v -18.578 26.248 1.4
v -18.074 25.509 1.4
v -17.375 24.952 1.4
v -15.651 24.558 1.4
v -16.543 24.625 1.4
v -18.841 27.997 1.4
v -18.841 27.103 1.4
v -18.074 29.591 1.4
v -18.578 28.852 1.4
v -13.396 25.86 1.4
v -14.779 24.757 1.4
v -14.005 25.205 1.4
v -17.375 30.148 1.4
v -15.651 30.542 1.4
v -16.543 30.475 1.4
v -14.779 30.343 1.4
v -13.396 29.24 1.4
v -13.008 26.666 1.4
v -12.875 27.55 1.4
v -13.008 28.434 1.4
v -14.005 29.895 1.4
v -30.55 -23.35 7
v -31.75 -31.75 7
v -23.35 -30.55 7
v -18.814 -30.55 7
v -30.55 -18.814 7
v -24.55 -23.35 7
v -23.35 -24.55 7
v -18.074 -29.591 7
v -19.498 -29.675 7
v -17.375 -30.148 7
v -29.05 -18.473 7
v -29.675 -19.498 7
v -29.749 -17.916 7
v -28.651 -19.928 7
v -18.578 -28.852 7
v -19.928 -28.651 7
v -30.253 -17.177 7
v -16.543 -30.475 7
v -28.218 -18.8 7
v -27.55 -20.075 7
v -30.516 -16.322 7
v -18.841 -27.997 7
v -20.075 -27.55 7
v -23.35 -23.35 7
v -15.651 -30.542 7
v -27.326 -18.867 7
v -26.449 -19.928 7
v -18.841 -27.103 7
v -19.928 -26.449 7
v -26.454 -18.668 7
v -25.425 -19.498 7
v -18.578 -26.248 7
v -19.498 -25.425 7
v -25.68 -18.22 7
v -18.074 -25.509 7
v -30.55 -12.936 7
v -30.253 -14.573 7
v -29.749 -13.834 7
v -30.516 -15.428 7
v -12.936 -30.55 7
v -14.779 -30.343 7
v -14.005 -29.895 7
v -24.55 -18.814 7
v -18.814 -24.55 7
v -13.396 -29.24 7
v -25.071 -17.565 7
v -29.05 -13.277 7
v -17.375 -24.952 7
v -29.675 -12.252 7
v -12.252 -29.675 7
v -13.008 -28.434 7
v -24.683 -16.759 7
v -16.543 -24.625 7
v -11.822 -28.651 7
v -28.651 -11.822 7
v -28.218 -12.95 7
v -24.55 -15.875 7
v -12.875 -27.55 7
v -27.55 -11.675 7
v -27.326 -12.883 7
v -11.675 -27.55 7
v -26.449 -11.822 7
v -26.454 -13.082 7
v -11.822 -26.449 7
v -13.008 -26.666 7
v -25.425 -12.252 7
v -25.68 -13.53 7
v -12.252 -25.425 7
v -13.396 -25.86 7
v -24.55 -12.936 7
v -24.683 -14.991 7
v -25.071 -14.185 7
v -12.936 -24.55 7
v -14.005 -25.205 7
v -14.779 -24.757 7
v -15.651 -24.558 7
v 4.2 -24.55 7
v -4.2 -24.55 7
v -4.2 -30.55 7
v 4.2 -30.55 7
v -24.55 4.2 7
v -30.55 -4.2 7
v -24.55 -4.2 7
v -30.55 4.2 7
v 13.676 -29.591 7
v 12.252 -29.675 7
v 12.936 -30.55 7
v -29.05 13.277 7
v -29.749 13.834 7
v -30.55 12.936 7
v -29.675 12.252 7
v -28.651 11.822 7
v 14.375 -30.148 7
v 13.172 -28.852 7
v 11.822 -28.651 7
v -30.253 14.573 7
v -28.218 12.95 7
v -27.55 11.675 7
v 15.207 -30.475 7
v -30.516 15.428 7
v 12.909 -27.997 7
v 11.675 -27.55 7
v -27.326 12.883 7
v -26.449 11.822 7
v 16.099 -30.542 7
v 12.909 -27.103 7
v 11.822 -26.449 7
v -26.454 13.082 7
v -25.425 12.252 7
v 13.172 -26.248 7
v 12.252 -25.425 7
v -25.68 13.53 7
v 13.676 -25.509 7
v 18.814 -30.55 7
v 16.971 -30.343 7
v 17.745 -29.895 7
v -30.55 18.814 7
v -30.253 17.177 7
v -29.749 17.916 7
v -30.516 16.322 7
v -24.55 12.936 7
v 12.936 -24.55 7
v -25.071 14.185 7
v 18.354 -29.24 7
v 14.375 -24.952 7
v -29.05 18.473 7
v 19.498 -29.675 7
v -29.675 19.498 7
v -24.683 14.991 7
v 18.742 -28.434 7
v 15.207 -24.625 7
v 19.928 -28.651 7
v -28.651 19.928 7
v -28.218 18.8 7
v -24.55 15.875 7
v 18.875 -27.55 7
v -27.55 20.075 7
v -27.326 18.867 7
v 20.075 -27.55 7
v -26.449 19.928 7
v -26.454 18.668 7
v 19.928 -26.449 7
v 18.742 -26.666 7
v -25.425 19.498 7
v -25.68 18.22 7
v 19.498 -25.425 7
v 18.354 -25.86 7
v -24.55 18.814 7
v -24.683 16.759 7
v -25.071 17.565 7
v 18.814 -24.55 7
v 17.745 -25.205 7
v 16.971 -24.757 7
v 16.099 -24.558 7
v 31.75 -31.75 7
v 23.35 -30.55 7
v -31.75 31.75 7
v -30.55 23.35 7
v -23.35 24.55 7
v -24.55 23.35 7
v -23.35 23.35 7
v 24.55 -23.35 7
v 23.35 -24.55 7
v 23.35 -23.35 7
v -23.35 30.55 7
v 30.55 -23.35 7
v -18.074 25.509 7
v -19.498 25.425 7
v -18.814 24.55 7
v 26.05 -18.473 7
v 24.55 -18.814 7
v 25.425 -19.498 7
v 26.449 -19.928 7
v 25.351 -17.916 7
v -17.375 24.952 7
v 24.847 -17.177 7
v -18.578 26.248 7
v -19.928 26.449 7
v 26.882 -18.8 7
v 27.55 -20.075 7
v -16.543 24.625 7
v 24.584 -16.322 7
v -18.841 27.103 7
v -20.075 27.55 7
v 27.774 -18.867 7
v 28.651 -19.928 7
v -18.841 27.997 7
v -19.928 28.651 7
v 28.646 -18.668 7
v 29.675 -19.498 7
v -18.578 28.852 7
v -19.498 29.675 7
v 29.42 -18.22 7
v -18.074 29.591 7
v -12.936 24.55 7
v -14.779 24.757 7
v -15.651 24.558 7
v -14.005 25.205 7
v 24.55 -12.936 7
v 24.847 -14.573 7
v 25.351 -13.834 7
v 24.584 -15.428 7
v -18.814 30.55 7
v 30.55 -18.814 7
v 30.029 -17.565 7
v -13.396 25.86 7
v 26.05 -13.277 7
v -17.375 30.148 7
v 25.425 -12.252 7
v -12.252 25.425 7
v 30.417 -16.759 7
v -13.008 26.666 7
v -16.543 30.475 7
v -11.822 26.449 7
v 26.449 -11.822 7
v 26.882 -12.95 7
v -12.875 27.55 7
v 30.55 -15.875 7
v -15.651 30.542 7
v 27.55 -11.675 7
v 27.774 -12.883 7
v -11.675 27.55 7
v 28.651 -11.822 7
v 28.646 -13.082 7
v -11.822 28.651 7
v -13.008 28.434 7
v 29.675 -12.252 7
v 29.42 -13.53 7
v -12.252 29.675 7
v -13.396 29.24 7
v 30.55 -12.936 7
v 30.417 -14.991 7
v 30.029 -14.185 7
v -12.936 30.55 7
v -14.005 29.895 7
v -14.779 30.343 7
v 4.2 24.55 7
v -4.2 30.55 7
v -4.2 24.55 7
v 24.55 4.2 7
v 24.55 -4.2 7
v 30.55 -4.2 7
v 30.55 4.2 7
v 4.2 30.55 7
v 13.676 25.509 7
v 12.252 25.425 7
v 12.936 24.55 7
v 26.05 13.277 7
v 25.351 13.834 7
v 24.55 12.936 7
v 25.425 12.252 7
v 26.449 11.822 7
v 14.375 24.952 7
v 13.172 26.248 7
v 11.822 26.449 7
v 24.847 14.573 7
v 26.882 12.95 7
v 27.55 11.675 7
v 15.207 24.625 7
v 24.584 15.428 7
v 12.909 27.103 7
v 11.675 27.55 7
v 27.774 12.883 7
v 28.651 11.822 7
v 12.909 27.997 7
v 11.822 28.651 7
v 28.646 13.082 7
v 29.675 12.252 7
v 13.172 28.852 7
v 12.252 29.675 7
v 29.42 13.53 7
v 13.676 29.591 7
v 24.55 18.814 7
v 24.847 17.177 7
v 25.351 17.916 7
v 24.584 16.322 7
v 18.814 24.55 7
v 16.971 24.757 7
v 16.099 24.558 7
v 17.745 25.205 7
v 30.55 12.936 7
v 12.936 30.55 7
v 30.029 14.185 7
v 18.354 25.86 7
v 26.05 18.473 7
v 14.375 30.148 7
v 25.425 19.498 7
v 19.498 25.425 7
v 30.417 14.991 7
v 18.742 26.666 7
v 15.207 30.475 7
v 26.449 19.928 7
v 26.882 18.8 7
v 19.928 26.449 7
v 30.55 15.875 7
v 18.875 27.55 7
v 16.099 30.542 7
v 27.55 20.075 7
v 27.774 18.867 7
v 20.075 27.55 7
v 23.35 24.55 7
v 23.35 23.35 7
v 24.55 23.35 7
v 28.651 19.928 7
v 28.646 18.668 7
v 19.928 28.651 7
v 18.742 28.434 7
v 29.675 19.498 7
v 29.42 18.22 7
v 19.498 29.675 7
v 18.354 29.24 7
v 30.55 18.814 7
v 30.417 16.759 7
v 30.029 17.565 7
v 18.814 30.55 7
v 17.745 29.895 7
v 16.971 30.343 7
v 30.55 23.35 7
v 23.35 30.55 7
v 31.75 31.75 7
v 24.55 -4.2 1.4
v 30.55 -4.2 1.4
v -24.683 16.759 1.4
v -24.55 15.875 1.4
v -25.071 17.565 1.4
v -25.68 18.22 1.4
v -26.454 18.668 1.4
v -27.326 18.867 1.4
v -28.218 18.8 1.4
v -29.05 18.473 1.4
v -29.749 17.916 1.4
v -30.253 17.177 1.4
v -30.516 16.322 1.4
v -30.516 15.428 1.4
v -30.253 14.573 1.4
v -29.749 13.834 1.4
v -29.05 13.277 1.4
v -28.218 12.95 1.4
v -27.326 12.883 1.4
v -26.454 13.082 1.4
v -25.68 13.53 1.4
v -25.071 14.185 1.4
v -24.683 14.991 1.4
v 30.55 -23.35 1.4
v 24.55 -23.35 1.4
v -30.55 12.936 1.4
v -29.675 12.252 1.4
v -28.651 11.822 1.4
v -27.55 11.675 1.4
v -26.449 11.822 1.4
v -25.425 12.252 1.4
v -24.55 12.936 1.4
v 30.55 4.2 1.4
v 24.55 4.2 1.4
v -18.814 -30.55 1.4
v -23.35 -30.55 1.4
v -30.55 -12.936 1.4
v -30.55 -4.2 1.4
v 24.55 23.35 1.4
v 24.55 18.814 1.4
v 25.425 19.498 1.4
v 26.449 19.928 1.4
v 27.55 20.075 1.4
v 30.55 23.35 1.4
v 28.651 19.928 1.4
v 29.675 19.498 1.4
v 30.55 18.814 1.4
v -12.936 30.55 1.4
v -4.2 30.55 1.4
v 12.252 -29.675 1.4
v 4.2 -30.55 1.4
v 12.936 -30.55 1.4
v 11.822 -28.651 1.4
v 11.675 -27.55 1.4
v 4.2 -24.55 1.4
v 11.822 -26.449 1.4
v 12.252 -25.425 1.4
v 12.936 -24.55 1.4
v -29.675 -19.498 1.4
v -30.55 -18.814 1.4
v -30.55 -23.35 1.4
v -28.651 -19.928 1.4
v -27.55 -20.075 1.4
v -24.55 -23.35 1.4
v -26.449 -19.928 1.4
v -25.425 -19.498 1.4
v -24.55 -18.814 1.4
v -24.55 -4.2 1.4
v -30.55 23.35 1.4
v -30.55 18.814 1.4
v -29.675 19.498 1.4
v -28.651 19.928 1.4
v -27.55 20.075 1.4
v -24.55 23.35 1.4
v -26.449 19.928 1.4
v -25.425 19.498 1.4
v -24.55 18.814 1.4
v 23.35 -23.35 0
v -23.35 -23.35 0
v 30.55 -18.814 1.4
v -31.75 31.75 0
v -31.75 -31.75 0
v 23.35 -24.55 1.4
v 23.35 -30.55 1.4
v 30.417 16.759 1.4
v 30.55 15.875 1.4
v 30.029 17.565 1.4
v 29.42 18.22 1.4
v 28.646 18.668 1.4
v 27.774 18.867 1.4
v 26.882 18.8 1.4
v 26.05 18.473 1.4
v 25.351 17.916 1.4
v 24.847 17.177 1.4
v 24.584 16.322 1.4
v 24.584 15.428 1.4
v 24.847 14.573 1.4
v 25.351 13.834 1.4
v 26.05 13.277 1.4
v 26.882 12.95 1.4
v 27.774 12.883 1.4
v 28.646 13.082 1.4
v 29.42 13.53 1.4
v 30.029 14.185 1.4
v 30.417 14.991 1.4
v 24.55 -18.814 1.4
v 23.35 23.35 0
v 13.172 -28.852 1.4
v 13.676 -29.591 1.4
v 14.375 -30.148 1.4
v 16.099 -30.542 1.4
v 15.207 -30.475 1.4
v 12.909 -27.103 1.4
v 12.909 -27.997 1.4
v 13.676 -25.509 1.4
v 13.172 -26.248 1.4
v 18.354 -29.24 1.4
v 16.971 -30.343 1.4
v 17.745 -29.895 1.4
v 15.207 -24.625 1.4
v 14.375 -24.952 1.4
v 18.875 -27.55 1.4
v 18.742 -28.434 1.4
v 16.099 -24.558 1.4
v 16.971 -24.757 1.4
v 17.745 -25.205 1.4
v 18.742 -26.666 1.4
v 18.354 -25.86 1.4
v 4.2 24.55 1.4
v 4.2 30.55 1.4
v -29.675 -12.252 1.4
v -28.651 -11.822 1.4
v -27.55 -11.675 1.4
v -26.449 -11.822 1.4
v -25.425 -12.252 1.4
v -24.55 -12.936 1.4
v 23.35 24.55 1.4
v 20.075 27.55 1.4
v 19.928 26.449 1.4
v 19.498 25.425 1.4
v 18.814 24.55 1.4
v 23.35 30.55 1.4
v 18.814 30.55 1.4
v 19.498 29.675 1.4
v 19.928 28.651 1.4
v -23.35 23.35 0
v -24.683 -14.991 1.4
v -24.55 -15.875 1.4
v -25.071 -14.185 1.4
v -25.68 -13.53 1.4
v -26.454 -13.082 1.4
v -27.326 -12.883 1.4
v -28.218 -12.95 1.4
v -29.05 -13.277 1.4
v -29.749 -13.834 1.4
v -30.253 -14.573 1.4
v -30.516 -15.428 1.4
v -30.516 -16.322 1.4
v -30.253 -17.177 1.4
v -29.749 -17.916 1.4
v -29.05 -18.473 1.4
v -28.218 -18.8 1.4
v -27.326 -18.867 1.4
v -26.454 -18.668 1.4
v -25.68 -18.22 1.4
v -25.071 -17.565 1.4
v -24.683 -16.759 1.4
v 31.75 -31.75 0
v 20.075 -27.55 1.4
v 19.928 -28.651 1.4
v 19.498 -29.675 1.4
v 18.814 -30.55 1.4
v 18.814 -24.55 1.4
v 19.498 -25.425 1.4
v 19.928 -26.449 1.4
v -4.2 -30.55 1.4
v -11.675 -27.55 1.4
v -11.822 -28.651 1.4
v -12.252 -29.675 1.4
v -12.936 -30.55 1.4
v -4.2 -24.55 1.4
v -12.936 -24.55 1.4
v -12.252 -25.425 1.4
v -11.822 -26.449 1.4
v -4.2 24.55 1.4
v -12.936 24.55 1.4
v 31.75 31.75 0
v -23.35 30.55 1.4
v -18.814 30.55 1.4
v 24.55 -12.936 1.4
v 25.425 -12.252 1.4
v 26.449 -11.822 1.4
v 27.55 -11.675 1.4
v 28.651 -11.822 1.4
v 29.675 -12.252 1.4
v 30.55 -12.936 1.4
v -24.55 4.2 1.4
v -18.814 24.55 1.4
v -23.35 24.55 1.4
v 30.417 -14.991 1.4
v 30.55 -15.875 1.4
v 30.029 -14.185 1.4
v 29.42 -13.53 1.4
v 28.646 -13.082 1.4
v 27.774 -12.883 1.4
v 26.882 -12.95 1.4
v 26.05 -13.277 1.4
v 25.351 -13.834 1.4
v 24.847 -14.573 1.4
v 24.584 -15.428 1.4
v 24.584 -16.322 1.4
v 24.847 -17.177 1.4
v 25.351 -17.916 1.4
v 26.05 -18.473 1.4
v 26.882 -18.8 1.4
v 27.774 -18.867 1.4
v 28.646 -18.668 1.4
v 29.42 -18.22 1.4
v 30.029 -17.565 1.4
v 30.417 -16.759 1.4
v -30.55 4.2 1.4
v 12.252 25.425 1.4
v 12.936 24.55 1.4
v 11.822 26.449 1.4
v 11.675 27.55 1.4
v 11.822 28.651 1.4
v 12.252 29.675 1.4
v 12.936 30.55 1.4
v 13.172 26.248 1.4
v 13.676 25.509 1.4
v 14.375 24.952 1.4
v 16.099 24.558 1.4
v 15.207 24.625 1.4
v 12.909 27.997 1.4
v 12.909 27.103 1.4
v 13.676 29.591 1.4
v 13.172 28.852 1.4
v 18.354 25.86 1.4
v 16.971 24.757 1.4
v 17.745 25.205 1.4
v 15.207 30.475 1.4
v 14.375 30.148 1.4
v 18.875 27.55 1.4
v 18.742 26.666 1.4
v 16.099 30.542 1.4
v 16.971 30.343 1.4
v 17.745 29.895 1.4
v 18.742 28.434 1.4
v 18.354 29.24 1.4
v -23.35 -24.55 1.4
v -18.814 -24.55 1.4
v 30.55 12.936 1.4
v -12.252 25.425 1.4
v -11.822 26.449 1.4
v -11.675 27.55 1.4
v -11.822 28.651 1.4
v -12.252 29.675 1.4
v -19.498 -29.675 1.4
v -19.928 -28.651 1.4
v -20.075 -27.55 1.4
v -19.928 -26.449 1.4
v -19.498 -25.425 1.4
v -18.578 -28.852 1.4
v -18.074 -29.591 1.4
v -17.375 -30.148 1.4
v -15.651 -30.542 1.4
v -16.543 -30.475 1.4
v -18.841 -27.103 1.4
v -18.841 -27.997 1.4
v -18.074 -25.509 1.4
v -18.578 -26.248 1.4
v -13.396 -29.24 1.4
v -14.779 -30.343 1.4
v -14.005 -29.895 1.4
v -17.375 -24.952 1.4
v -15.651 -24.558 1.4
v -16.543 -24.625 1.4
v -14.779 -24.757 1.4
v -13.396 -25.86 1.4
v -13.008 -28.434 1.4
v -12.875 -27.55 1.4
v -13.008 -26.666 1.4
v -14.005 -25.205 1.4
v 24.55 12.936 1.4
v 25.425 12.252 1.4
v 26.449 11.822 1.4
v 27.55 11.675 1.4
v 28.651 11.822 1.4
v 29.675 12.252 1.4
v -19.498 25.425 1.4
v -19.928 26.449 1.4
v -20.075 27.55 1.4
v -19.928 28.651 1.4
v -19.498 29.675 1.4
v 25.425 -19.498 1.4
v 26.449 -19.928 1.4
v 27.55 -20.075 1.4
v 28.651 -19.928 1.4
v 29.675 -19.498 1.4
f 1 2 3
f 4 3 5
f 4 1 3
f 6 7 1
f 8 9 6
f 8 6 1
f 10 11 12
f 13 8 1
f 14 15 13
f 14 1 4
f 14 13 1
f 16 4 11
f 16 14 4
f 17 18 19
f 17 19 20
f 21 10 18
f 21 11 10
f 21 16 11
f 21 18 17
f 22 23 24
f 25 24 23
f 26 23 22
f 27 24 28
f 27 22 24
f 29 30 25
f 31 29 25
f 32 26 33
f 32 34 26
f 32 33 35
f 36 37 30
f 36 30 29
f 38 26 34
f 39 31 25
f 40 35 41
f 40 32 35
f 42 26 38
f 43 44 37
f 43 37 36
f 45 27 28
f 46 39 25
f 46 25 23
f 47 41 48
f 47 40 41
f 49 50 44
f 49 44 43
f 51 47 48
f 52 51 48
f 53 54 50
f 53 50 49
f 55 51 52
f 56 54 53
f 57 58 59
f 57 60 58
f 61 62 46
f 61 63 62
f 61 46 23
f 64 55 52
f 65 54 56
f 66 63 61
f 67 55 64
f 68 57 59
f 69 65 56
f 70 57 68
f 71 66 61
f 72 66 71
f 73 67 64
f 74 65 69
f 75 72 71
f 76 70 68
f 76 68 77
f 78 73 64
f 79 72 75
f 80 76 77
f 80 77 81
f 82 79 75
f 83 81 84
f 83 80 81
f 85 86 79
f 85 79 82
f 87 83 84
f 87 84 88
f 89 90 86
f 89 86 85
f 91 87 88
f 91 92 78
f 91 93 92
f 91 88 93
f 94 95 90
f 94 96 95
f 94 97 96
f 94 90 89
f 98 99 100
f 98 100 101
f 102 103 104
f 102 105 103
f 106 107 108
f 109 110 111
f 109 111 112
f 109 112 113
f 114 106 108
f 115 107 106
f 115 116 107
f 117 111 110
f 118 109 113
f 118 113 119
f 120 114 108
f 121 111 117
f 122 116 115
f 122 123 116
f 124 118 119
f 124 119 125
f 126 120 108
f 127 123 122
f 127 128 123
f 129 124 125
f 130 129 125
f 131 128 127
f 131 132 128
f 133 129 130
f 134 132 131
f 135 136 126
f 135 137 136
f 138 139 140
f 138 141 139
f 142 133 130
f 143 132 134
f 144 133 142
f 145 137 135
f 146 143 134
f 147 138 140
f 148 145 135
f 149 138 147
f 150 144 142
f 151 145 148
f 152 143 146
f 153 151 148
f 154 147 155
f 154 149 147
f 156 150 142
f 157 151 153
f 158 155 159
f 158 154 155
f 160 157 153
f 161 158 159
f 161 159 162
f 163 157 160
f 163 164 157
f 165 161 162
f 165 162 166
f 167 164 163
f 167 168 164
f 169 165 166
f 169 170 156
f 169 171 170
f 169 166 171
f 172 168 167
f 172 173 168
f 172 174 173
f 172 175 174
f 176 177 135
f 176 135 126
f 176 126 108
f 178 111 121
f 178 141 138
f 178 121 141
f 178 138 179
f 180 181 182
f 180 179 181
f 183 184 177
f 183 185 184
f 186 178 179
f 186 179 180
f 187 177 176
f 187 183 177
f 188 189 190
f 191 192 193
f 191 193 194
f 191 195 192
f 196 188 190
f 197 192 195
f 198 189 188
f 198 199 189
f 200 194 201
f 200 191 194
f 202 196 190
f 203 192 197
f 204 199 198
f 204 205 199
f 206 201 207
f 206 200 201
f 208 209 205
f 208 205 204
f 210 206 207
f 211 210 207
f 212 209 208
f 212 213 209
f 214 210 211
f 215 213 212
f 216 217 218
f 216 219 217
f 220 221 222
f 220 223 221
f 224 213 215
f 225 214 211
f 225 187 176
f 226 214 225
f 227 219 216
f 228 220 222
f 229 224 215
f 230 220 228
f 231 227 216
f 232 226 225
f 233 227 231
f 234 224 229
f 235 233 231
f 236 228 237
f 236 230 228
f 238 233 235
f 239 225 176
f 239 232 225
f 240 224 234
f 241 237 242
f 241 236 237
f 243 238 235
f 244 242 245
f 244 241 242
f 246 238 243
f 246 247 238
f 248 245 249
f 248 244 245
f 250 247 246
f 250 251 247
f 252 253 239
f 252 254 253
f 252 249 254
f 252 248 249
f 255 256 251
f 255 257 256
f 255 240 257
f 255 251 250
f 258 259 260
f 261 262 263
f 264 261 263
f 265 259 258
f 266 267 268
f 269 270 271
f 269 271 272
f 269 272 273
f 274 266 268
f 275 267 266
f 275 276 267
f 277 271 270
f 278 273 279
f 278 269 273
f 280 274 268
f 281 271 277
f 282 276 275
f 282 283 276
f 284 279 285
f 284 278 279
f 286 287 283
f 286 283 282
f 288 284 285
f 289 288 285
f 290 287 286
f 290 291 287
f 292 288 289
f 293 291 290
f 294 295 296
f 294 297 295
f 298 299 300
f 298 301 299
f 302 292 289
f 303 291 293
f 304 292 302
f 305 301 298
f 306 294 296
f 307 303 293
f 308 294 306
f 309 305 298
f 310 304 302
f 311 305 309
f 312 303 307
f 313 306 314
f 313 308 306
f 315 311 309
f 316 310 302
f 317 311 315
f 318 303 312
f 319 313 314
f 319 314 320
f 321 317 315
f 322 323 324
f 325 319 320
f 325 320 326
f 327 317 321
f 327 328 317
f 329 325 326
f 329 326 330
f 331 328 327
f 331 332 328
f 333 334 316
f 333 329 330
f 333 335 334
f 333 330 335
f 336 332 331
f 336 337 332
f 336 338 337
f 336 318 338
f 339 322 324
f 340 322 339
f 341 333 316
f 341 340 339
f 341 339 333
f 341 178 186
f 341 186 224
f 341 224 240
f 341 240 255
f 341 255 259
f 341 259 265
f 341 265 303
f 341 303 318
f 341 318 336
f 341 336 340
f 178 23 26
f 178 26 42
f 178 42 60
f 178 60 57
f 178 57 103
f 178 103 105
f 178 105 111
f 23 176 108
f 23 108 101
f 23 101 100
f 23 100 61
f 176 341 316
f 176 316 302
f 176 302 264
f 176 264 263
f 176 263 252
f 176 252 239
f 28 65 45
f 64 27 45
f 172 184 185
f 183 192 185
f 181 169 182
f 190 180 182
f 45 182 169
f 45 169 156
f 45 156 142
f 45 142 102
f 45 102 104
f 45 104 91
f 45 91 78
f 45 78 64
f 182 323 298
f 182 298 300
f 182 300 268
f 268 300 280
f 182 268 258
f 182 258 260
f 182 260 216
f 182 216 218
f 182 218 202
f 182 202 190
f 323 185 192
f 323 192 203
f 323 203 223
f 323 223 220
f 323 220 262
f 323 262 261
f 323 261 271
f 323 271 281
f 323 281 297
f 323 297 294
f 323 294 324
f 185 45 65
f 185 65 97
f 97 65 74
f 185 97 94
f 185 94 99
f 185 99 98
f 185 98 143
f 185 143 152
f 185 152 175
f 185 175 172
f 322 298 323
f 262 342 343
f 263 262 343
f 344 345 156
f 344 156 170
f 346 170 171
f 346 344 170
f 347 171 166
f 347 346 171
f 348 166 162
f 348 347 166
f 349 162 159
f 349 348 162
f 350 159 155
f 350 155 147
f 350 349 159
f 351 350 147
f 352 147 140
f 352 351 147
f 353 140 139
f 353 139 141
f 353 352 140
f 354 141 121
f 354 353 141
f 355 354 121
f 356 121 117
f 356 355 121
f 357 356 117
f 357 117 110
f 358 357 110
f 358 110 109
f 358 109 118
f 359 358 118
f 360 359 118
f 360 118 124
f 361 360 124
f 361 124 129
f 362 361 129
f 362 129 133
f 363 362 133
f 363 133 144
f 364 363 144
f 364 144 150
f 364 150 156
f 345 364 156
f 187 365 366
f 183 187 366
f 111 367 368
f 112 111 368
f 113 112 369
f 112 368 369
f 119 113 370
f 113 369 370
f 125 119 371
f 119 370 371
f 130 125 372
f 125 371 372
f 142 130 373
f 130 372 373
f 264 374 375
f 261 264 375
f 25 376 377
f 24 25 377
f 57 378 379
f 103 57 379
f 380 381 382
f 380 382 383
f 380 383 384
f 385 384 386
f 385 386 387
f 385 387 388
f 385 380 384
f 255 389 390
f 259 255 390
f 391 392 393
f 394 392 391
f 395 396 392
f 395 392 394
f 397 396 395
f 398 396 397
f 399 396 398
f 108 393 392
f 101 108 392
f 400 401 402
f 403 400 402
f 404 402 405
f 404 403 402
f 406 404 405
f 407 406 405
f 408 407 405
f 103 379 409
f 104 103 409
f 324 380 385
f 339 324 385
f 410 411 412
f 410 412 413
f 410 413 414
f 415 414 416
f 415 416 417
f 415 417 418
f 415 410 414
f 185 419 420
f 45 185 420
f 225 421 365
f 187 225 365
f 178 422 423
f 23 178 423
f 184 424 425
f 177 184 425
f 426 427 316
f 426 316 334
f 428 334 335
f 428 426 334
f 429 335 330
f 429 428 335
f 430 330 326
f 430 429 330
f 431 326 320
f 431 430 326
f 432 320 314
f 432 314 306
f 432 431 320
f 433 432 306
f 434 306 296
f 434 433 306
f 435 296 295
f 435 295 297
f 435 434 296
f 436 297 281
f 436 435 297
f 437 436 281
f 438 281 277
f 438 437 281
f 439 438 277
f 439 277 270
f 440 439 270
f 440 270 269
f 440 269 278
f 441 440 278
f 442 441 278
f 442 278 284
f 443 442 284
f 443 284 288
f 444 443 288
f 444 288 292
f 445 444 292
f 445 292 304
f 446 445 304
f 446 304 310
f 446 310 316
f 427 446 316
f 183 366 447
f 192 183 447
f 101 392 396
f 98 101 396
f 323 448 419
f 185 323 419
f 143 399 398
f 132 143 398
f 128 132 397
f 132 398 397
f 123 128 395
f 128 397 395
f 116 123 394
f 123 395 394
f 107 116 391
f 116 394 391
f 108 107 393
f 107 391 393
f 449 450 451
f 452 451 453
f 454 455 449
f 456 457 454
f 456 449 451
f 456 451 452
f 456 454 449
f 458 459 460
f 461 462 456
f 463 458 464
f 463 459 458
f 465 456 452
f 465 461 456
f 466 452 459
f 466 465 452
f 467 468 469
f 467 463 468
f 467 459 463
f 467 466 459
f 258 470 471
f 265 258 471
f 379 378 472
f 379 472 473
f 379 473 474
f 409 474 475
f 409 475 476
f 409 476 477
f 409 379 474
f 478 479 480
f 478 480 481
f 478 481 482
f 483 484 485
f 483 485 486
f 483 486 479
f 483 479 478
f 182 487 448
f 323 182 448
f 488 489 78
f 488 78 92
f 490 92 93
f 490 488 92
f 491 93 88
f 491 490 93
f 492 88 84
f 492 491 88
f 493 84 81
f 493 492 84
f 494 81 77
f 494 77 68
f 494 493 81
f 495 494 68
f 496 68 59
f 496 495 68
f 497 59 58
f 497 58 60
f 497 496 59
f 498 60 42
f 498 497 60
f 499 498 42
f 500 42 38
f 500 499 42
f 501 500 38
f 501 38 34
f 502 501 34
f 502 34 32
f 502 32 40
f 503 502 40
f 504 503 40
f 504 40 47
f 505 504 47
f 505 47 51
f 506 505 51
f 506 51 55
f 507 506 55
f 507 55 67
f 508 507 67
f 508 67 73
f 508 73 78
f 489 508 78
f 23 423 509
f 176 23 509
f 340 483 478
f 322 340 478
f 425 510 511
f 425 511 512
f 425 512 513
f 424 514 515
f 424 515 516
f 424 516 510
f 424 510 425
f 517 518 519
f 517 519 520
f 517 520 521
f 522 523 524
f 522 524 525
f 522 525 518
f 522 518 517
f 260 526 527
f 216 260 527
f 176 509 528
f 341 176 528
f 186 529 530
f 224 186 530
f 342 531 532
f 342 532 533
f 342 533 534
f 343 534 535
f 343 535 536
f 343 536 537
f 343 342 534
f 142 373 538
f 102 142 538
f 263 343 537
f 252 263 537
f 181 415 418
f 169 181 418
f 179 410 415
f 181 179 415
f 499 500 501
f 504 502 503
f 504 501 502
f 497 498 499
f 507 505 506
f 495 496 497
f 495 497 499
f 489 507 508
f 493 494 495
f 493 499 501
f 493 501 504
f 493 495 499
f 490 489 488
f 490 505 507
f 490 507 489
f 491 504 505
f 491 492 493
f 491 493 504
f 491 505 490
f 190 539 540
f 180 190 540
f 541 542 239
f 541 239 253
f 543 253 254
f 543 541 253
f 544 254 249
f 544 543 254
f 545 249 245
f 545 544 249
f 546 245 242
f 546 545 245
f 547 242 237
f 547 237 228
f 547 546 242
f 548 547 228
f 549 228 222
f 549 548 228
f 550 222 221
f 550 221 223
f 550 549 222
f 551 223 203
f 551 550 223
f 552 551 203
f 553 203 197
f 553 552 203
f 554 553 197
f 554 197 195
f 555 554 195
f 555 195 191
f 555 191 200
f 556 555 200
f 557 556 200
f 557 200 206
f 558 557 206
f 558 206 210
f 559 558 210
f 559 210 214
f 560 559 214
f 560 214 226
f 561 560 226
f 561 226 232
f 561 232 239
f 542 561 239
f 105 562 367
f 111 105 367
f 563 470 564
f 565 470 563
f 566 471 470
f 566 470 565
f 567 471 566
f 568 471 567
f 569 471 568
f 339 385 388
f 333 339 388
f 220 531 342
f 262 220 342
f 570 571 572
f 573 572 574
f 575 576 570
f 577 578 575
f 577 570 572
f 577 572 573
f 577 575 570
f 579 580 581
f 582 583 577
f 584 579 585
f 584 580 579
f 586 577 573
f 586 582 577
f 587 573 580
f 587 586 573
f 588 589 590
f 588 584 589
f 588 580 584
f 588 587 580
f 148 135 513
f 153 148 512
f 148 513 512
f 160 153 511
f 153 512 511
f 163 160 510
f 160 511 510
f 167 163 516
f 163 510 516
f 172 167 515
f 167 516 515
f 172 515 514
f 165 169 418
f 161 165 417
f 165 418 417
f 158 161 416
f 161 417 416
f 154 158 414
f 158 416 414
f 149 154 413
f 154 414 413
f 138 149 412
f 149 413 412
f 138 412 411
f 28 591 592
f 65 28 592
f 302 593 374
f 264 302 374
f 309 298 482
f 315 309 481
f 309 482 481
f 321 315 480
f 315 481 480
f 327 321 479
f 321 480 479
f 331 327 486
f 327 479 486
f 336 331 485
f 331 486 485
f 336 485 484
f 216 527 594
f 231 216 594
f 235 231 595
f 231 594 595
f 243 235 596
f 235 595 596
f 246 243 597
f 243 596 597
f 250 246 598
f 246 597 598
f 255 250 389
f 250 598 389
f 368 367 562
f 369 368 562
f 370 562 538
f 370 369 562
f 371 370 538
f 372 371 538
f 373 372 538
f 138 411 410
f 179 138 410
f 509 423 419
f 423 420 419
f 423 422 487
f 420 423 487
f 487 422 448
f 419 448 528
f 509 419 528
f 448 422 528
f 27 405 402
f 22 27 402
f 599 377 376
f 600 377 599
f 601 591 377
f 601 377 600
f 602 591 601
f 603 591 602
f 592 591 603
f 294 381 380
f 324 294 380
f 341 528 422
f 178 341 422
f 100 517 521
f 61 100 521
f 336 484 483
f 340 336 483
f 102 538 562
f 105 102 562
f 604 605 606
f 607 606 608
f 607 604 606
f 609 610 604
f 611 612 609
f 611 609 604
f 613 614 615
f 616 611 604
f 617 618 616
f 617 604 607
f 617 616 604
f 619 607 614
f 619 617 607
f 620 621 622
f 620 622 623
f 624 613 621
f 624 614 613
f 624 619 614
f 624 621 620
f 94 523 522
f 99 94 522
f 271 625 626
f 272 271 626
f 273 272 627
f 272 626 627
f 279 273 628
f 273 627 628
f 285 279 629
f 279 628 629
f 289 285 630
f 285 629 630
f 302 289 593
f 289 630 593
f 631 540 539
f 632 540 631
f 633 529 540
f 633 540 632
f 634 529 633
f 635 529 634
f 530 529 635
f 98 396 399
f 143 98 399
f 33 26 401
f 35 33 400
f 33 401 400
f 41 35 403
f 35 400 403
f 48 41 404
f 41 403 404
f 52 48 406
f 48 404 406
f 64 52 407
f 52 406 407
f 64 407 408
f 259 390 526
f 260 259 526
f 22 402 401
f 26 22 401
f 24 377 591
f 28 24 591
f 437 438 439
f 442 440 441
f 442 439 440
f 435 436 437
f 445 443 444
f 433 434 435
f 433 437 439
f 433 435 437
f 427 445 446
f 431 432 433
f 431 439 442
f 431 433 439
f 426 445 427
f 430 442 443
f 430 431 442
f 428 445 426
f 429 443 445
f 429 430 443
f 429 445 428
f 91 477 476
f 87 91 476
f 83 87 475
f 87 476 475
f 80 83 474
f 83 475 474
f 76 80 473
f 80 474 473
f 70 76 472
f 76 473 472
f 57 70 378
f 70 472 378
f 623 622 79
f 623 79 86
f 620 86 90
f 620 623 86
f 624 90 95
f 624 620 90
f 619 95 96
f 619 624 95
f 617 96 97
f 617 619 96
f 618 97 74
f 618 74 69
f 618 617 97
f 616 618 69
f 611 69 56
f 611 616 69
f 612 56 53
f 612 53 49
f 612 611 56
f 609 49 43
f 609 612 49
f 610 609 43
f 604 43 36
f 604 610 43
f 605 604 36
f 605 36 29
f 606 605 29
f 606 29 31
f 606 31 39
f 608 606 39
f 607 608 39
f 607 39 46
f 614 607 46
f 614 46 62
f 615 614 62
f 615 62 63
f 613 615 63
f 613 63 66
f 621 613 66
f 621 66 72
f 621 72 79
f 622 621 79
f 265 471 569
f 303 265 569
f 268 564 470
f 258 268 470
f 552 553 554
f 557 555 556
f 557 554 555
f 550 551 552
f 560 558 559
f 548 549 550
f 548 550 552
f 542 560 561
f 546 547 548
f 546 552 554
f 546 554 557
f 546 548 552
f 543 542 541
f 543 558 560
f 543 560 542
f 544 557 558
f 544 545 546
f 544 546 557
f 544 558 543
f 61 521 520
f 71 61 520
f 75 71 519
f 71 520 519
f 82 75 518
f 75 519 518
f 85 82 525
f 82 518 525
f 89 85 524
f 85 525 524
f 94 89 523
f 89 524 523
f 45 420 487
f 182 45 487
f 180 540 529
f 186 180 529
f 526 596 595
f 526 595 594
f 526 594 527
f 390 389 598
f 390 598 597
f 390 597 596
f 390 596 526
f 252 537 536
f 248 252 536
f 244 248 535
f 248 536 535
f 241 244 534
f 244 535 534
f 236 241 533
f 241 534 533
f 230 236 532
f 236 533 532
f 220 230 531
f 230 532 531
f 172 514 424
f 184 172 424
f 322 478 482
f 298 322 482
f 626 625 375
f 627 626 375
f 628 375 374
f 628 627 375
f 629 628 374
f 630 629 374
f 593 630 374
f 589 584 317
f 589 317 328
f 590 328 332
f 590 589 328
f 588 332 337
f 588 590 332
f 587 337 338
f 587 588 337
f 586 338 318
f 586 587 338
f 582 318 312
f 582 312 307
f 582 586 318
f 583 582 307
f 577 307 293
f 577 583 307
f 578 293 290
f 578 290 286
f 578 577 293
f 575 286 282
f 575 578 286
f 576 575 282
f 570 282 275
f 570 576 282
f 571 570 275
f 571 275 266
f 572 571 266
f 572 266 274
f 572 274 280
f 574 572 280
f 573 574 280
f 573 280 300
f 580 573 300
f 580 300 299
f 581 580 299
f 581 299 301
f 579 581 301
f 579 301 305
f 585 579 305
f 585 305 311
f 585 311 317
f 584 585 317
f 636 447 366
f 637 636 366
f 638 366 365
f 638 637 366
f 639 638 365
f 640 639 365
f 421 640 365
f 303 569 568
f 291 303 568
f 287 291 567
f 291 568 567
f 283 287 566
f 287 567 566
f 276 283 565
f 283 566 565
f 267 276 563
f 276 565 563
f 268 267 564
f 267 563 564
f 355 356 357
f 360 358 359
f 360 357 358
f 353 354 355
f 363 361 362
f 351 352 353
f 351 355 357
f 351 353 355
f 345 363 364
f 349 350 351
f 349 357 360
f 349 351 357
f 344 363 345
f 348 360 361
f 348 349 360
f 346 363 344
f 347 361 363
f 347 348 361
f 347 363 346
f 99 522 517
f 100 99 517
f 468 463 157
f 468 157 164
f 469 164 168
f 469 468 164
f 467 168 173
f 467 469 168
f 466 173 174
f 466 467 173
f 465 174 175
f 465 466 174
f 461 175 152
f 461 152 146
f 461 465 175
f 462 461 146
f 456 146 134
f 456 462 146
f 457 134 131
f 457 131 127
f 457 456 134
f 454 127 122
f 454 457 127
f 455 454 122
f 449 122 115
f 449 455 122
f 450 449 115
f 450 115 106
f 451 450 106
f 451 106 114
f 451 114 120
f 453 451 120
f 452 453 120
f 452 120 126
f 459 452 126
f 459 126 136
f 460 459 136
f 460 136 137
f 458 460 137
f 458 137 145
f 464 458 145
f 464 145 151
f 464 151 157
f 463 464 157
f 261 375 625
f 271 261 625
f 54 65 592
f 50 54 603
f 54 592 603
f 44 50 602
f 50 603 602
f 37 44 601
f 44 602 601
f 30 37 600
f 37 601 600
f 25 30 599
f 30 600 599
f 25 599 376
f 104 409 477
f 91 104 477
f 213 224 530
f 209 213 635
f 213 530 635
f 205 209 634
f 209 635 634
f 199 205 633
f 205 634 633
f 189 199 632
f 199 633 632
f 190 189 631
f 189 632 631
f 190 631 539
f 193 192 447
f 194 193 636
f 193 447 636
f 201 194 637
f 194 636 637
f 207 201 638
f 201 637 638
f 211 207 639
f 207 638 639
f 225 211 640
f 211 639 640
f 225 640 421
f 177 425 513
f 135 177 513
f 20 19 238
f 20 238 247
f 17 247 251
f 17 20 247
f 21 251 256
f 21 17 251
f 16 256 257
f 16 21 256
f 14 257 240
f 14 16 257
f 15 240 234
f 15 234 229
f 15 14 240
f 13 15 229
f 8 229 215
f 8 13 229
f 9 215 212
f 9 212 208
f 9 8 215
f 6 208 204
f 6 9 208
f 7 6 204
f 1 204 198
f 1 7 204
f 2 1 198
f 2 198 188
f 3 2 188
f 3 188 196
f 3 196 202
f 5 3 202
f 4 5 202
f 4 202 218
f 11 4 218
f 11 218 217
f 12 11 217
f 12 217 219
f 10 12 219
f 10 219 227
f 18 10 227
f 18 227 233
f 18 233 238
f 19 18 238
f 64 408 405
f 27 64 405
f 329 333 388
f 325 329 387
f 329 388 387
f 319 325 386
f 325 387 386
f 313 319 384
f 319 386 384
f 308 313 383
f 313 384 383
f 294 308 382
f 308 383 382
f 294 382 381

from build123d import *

# Parameters (mm, degrees)
F0_R     = 3
F1_DEPTH = 1.4
F2_DEPTH = 7


with BuildPart() as f1:
    # F0 (on Top) → F1 (new body)
    with BuildSketch(Plane.XY):
        Polygon((31.75, 31.75), (0, 31.75), (-31.75, 31.75), (-31.75, 0), (-31.75, -31.75), (0, -31.75), (31.75, -31.75), (31.75, 0), align=None)
        with BuildLine():
            ThreePointArc((-18.814388, -24.55), (-20.075, -27.55), (-18.814388, -30.55))
            Line((-18.814388, -30.55), (-23.35, -30.55))
            Line((-23.35, -30.55), (-23.35, -24.55))
            Line((-23.35, -24.55), (-18.814388, -24.55))
        make_face(mode=Mode.SUBTRACT)
        with BuildLine():
            Line((-24.55, -18.814388), (-24.55, -23.35))
            Line((-24.55, -23.35), (-30.55, -23.35))
            Line((-30.55, -23.35), (-30.55, -18.814388))
            ThreePointArc((-30.55, -18.814388), (-27.55, -20.075), (-24.55, -18.814388))
        make_face(mode=Mode.SUBTRACT)
        with Locations((-15.875, -27.55)):
            Circle(F0_R, mode=Mode.SUBTRACT)
        with Locations((-27.55, -15.875)):
            Circle(F0_R, mode=Mode.SUBTRACT)
        with BuildLine():
            Line((4.2, -30.55), (0, -30.55))
            Line((0, -30.55), (-4.2, -30.55))
            Line((-4.2, -30.55), (-12.935612, -30.55))
            ThreePointArc((-12.935612, -30.55), (-11.675, -27.55), (-12.935612, -24.55))
            Line((-12.935612, -24.55), (-4.2, -24.55))
            Line((-4.2, -24.55), (0, -24.55))
            Line((0, -24.55), (4.2, -24.55))
            Line((4.2, -24.55), (12.935612, -24.55))
            ThreePointArc((12.935612, -24.55), (11.675, -27.55), (12.935612, -30.55))
            Line((12.935612, -30.55), (4.2, -30.55))
        make_face(mode=Mode.SUBTRACT)
        with Locations((15.875, -27.55)):
            Circle(F0_R, mode=Mode.SUBTRACT)
        with BuildLine():
            Line((23.35, -30.55), (18.814388, -30.55))
            ThreePointArc((18.814388, -30.55), (20.075, -27.55), (18.814388, -24.55))
            Line((18.814388, -24.55), (23.35, -24.55))
            Line((23.35, -24.55), (23.35, -30.55))
        make_face(mode=Mode.SUBTRACT)
        with BuildLine():
            Line((30.55, -23.35), (24.55, -23.35))
            Line((24.55, -23.35), (24.55, -18.814388))
            ThreePointArc((24.55, -18.814388), (27.55, -20.075), (30.55, -18.814388))
            Line((30.55, -18.814388), (30.55, -23.35))
        make_face(mode=Mode.SUBTRACT)
        with Locations((27.55, -15.875)):
            Circle(F0_R, mode=Mode.SUBTRACT)
        with BuildLine():
            Line((-30.55, 0), (-30.55, 4.2))
            Line((-30.55, 4.2), (-30.55, 12.935612))
            ThreePointArc((-30.55, 12.935612), (-27.55, 11.675), (-24.55, 12.935612))
            Line((-24.55, 12.935612), (-24.55, 4.2))
            Line((-24.55, 4.2), (-24.55, 0))
            Line((-24.55, 0), (-24.55, -4.2))
            Line((-24.55, -4.2), (-24.55, -12.935612))
            ThreePointArc((-24.55, -12.935612), (-27.55, -11.675), (-30.55, -12.935612))
            Line((-30.55, -12.935612), (-30.55, -4.2))
            Line((-30.55, -4.2), (-30.55, 0))
        make_face(mode=Mode.SUBTRACT)
        with Locations((-27.55, 15.875)):
            Circle(F0_R, mode=Mode.SUBTRACT)
        with BuildLine():
            Line((-30.55, 18.814388), (-30.55, 23.35))
            Line((-30.55, 23.35), (-24.55, 23.35))
            Line((-24.55, 23.35), (-24.55, 18.814388))
            ThreePointArc((-24.55, 18.814388), (-27.55, 20.075), (-30.55, 18.814388))
        make_face(mode=Mode.SUBTRACT)
        with BuildLine():
            Line((-18.814388, 24.55), (-23.35, 24.55))
            Line((-23.35, 24.55), (-23.35, 30.55))
            Line((-23.35, 30.55), (-18.814388, 30.55))
            ThreePointArc((-18.814388, 30.55), (-20.075, 27.55), (-18.814388, 24.55))
        make_face(mode=Mode.SUBTRACT)
        with Locations((-15.875, 27.55)):
            Circle(F0_R, mode=Mode.SUBTRACT)
        Polygon((-23.35, 0), (-23.35, 23.35), (0, 23.35), (23.35, 23.35), (23.35, 0), (23.35, -23.35), (0, -23.35), (-23.35, -23.35), align=None, mode=Mode.SUBTRACT)
        with BuildLine():
            Line((24.55, 4.2), (24.55, 12.935612))
            ThreePointArc((24.55, 12.935612), (27.55, 11.675), (30.55, 12.935612))
            Line((30.55, 12.935612), (30.55, 4.2))
            Line((30.55, 4.2), (30.55, 0))
            Line((30.55, 0), (30.55, -4.2))
            Line((30.55, -4.2), (30.55, -12.935612))
            ThreePointArc((30.55, -12.935612), (27.55, -11.675), (24.55, -12.935612))
            Line((24.55, -12.935612), (24.55, -4.2))
            Line((24.55, -4.2), (24.55, 0))
            Line((24.55, 0), (24.55, 4.2))
        make_face(mode=Mode.SUBTRACT)
        with BuildLine():
            Line((-4.2, 30.55), (0, 30.55))
            Line((0, 30.55), (4.2, 30.55))
            Line((4.2, 30.55), (12.935612, 30.55))
            ThreePointArc((12.935612, 30.55), (11.675, 27.55), (12.935612, 24.55))
            Line((12.935612, 24.55), (4.2, 24.55))
            Line((4.2, 24.55), (0, 24.55))
            Line((0, 24.55), (-4.2, 24.55))
            Line((-4.2, 24.55), (-12.935612, 24.55))
            ThreePointArc((-12.935612, 24.55), (-11.675, 27.55), (-12.935612, 30.55))
            Line((-12.935612, 30.55), (-4.2, 30.55))
        make_face(mode=Mode.SUBTRACT)
        with Locations((27.55, 15.875)):
            Circle(F0_R, mode=Mode.SUBTRACT)
        with BuildLine():
            ThreePointArc((30.55, 18.814388), (27.55, 20.075), (24.55, 18.814388))
            Line((24.55, 18.814388), (24.55, 23.35))
            Line((24.55, 23.35), (30.55, 23.35))
            Line((30.55, 23.35), (30.55, 18.814388))
        make_face(mode=Mode.SUBTRACT)
        with Locations((15.875, 27.55)):
            Circle(F0_R, mode=Mode.SUBTRACT)
        with BuildLine():
            ThreePointArc((18.814388, 24.55), (20.075, 27.55), (18.814388, 30.55))
            Line((18.814388, 30.55), (23.35, 30.55))
            Line((23.35, 30.55), (23.35, 24.55))
            Line((23.35, 24.55), (18.814388, 24.55))
        make_face(mode=Mode.SUBTRACT)
        with BuildLine():
            Line((-24.55, 23.35), (-30.55, 23.35))
            Line((-30.55, 23.35), (-30.55, 18.814388))
            ThreePointArc((-30.55, 18.814388), (-27.55, 20.075), (-24.55, 18.814388))
            Line((-24.55, 18.814388), (-24.55, 23.35))
        make_face()
        with Locations((-27.55, 15.875)):
            Circle(F0_R)
        with Locations((-15.875, 27.55)):
            Circle(F0_R)
        with BuildLine():
            Line((-23.35, 30.55), (-23.35, 24.55))
            Line((-23.35, 24.55), (-18.814388, 24.55))
            ThreePointArc((-18.814388, 24.55), (-20.075, 27.55), (-18.814388, 30.55))
            Line((-18.814388, 30.55), (-23.35, 30.55))
        make_face()
        Polygon((4.2, 30.55), (0, 30.55), (-4.2, 30.55), (-4.2, 24.55), (0, 24.55), (4.2, 24.55), align=None)
        with BuildLine():
            Line((-4.2, 24.55), (-4.2, 30.55))
            Line((-4.2, 30.55), (-12.935612, 30.55))
            ThreePointArc((-12.935612, 30.55), (-11.675, 27.55), (-12.935612, 24.55))
            Line((-12.935612, 24.55), (-4.2, 24.55))
        make_face()
        with BuildLine():
            Line((12.935612, 30.55), (4.2, 30.55))
            Line((4.2, 30.55), (4.2, 24.55))
            Line((4.2, 24.55), (12.935612, 24.55))
            ThreePointArc((12.935612, 24.55), (11.675, 27.55), (12.935612, 30.55))
        make_face()
        with Locations((15.875, 27.55)):
            Circle(F0_R)
        with BuildLine():
            Line((23.35, 30.55), (18.814388, 30.55))
            ThreePointArc((18.814388, 30.55), (20.075, 27.55), (18.814388, 24.55))
            Line((18.814388, 24.55), (23.35, 24.55))
            Line((23.35, 24.55), (23.35, 30.55))
        make_face()
        with BuildLine():
            Line((24.55, 23.35), (24.55, 18.814388))
            ThreePointArc((24.55, 18.814388), (27.55, 20.075), (30.55, 18.814388))
            Line((30.55, 18.814388), (30.55, 23.35))
            Line((30.55, 23.35), (24.55, 23.35))
        make_face()
        with Locations((27.55, 15.875)):
            Circle(F0_R)
        with BuildLine():
            ThreePointArc((30.55, 12.935612), (27.55, 11.675), (24.55, 12.935612))
            Line((24.55, 12.935612), (24.55, 4.2))
            Line((24.55, 4.2), (30.55, 4.2))
            Line((30.55, 4.2), (30.55, 12.935612))
        make_face()
        Polygon((30.55, 4.2), (24.55, 4.2), (24.55, 0), (24.55, -4.2), (30.55, -4.2), (30.55, 0), align=None)
        with BuildLine():
            Line((30.55, -4.2), (24.55, -4.2))
            Line((24.55, -4.2), (24.55, -12.935612))
            ThreePointArc((24.55, -12.935612), (27.55, -11.675), (30.55, -12.935612))
            Line((30.55, -12.935612), (30.55, -4.2))
        make_face()
        with Locations((27.55, -15.875)):
            Circle(F0_R)
        with BuildLine():
            Line((24.55, -18.814388), (24.55, -23.35))
            Line((24.55, -23.35), (30.55, -23.35))
            Line((30.55, -23.35), (30.55, -18.814388))
            ThreePointArc((30.55, -18.814388), (27.55, -20.075), (24.55, -18.814388))
        make_face()
        with BuildLine():
            ThreePointArc((18.814388, -24.55), (20.075, -27.55), (18.814388, -30.55))
            Line((18.814388, -30.55), (23.35, -30.55))
            Line((23.35, -30.55), (23.35, -24.55))
            Line((23.35, -24.55), (18.814388, -24.55))
        make_face()
        with Locations((15.875, -27.55)):
            Circle(F0_R)
        with BuildLine():
            Line((4.2, -24.55), (4.2, -30.55))
            Line((4.2, -30.55), (12.935612, -30.55))
            ThreePointArc((12.935612, -30.55), (11.675, -27.55), (12.935612, -24.55))
            Line((12.935612, -24.55), (4.2, -24.55))
        make_face()
        Polygon((-4.2, -30.55), (0, -30.55), (4.2, -30.55), (4.2, -24.55), (0, -24.55), (-4.2, -24.55), align=None)
        with BuildLine():
            Line((-12.935612, -30.55), (-4.2, -30.55))
            Line((-4.2, -30.55), (-4.2, -24.55))
            Line((-4.2, -24.55), (-12.935612, -24.55))
            ThreePointArc((-12.935612, -24.55), (-11.675, -27.55), (-12.935612, -30.55))
        make_face()
        with BuildLine():
            Line((-23.35, -30.55), (-18.814388, -30.55))
            ThreePointArc((-18.814388, -30.55), (-20.075, -27.55), (-18.814388, -24.55))
            Line((-18.814388, -24.55), (-23.35, -24.55))
            Line((-23.35, -24.55), (-23.35, -30.55))
        make_face()
        with Locations((-15.875, -27.55)):
            Circle(F0_R)
        with BuildLine():
            Line((-30.55, -23.35), (-24.55, -23.35))
            Line((-24.55, -23.35), (-24.55, -18.814388))
            ThreePointArc((-24.55, -18.814388), (-27.55, -20.075), (-30.55, -18.814388))
            Line((-30.55, -18.814388), (-30.55, -23.35))
        make_face()
        with Locations((-27.55, -15.875)):
            Circle(F0_R)
        with BuildLine():
            Line((-24.55, -4.2), (-30.55, -4.2))
            Line((-30.55, -4.2), (-30.55, -12.935612))
            ThreePointArc((-30.55, -12.935612), (-27.55, -11.675), (-24.55, -12.935612))
            Line((-24.55, -12.935612), (-24.55, -4.2))
        make_face()
        Polygon((-24.55, 4.2), (-30.55, 4.2), (-30.55, 0), (-30.55, -4.2), (-24.55, -4.2), (-24.55, 0), align=None)
        with BuildLine():
            Line((-30.55, 12.935612), (-30.55, 4.2))
            Line((-30.55, 4.2), (-24.55, 4.2))
            Line((-24.55, 4.2), (-24.55, 12.935612))
            ThreePointArc((-24.55, 12.935612), (-27.55, 11.675), (-30.55, 12.935612))
        make_face()
    extrude(amount=F1_DEPTH)

    # F0 (on Top) → F2 (join)
    with BuildSketch(Plane.XY):
        Polygon((31.75, 31.75), (0, 31.75), (-31.75, 31.75), (-31.75, 0), (-31.75, -31.75), (0, -31.75), (31.75, -31.75), (31.75, 0), align=None)
        with BuildLine():
            ThreePointArc((-18.814388, -24.55), (-20.075, -27.55), (-18.814388, -30.55))
            Line((-18.814388, -30.55), (-23.35, -30.55))
            Line((-23.35, -30.55), (-23.35, -24.55))
            Line((-23.35, -24.55), (-18.814388, -24.55))
        make_face(mode=Mode.SUBTRACT)
        with BuildLine():
            Line((-24.55, -18.814388), (-24.55, -23.35))
            Line((-24.55, -23.35), (-30.55, -23.35))
            Line((-30.55, -23.35), (-30.55, -18.814388))
            ThreePointArc((-30.55, -18.814388), (-27.55, -20.075), (-24.55, -18.814388))
        make_face(mode=Mode.SUBTRACT)
        with Locations((-15.875, -27.55)):
            Circle(F0_R, mode=Mode.SUBTRACT)
        with Locations((-27.55, -15.875)):
            Circle(F0_R, mode=Mode.SUBTRACT)
        with BuildLine():
            Line((4.2, -30.55), (0, -30.55))
            Line((0, -30.55), (-4.2, -30.55))
            Line((-4.2, -30.55), (-12.935612, -30.55))
            ThreePointArc((-12.935612, -30.55), (-11.675, -27.55), (-12.935612, -24.55))
            Line((-12.935612, -24.55), (-4.2, -24.55))
            Line((-4.2, -24.55), (0, -24.55))
            Line((0, -24.55), (4.2, -24.55))
            Line((4.2, -24.55), (12.935612, -24.55))
            ThreePointArc((12.935612, -24.55), (11.675, -27.55), (12.935612, -30.55))
            Line((12.935612, -30.55), (4.2, -30.55))
        make_face(mode=Mode.SUBTRACT)
        with Locations((15.875, -27.55)):
            Circle(F0_R, mode=Mode.SUBTRACT)
        with BuildLine():
            Line((23.35, -30.55), (18.814388, -30.55))
            ThreePointArc((18.814388, -30.55), (20.075, -27.55), (18.814388, -24.55))
            Line((18.814388, -24.55), (23.35, -24.55))
            Line((23.35, -24.55), (23.35, -30.55))
        make_face(mode=Mode.SUBTRACT)
        with BuildLine():
            Line((30.55, -23.35), (24.55, -23.35))
            Line((24.55, -23.35), (24.55, -18.814388))
            ThreePointArc((24.55, -18.814388), (27.55, -20.075), (30.55, -18.814388))
            Line((30.55, -18.814388), (30.55, -23.35))
        make_face(mode=Mode.SUBTRACT)
        with Locations((27.55, -15.875)):
            Circle(F0_R, mode=Mode.SUBTRACT)
        with BuildLine():
            Line((-30.55, 0), (-30.55, 4.2))
            Line((-30.55, 4.2), (-30.55, 12.935612))
            ThreePointArc((-30.55, 12.935612), (-27.55, 11.675), (-24.55, 12.935612))
            Line((-24.55, 12.935612), (-24.55, 4.2))
            Line((-24.55, 4.2), (-24.55, 0))
            Line((-24.55, 0), (-24.55, -4.2))
            Line((-24.55, -4.2), (-24.55, -12.935612))
            ThreePointArc((-24.55, -12.935612), (-27.55, -11.675), (-30.55, -12.935612))
            Line((-30.55, -12.935612), (-30.55, -4.2))
            Line((-30.55, -4.2), (-30.55, 0))
        make_face(mode=Mode.SUBTRACT)
        with Locations((-27.55, 15.875)):
            Circle(F0_R, mode=Mode.SUBTRACT)
        with BuildLine():
            Line((-30.55, 18.814388), (-30.55, 23.35))
            Line((-30.55, 23.35), (-24.55, 23.35))
            Line((-24.55, 23.35), (-24.55, 18.814388))
            ThreePointArc((-24.55, 18.814388), (-27.55, 20.075), (-30.55, 18.814388))
        make_face(mode=Mode.SUBTRACT)
        with BuildLine():
            Line((-18.814388, 24.55), (-23.35, 24.55))
            Line((-23.35, 24.55), (-23.35, 30.55))
            Line((-23.35, 30.55), (-18.814388, 30.55))
            ThreePointArc((-18.814388, 30.55), (-20.075, 27.55), (-18.814388, 24.55))
        make_face(mode=Mode.SUBTRACT)
        with Locations((-15.875, 27.55)):
            Circle(F0_R, mode=Mode.SUBTRACT)
        Polygon((-23.35, 0), (-23.35, 23.35), (0, 23.35), (23.35, 23.35), (23.35, 0), (23.35, -23.35), (0, -23.35), (-23.35, -23.35), align=None, mode=Mode.SUBTRACT)
        with BuildLine():
            Line((24.55, 4.2), (24.55, 12.935612))
            ThreePointArc((24.55, 12.935612), (27.55, 11.675), (30.55, 12.935612))
            Line((30.55, 12.935612), (30.55, 4.2))
            Line((30.55, 4.2), (30.55, 0))
            Line((30.55, 0), (30.55, -4.2))
            Line((30.55, -4.2), (30.55, -12.935612))
            ThreePointArc((30.55, -12.935612), (27.55, -11.675), (24.55, -12.935612))
            Line((24.55, -12.935612), (24.55, -4.2))
            Line((24.55, -4.2), (24.55, 0))
            Line((24.55, 0), (24.55, 4.2))
        make_face(mode=Mode.SUBTRACT)
        with BuildLine():
            Line((-4.2, 30.55), (0, 30.55))
            Line((0, 30.55), (4.2, 30.55))
            Line((4.2, 30.55), (12.935612, 30.55))
            ThreePointArc((12.935612, 30.55), (11.675, 27.55), (12.935612, 24.55))
            Line((12.935612, 24.55), (4.2, 24.55))
            Line((4.2, 24.55), (0, 24.55))
            Line((0, 24.55), (-4.2, 24.55))
            Line((-4.2, 24.55), (-12.935612, 24.55))
            ThreePointArc((-12.935612, 24.55), (-11.675, 27.55), (-12.935612, 30.55))
            Line((-12.935612, 30.55), (-4.2, 30.55))
        make_face(mode=Mode.SUBTRACT)
        with Locations((27.55, 15.875)):
            Circle(F0_R, mode=Mode.SUBTRACT)
        with BuildLine():
            ThreePointArc((30.55, 18.814388), (27.55, 20.075), (24.55, 18.814388))
            Line((24.55, 18.814388), (24.55, 23.35))
            Line((24.55, 23.35), (30.55, 23.35))
            Line((30.55, 23.35), (30.55, 18.814388))
        make_face(mode=Mode.SUBTRACT)
        with Locations((15.875, 27.55)):
            Circle(F0_R, mode=Mode.SUBTRACT)
        with BuildLine():
            ThreePointArc((18.814388, 24.55), (20.075, 27.55), (18.814388, 30.55))
            Line((18.814388, 30.55), (23.35, 30.55))
            Line((23.35, 30.55), (23.35, 24.55))
            Line((23.35, 24.55), (18.814388, 24.55))
        make_face(mode=Mode.SUBTRACT)
        Polygon((-4.2, -30.55), (0, -30.55), (4.2, -30.55), (4.2, -24.55), (0, -24.55), (-4.2, -24.55), align=None)
        Polygon((30.55, 4.2), (24.55, 4.2), (24.55, 0), (24.55, -4.2), (30.55, -4.2), (30.55, 0), align=None)
        Polygon((4.2, 30.55), (0, 30.55), (-4.2, 30.55), (-4.2, 24.55), (0, 24.55), (4.2, 24.55), align=None)
        Polygon((-24.55, 4.2), (-30.55, 4.2), (-30.55, 0), (-30.55, -4.2), (-24.55, -4.2), (-24.55, 0), align=None)
    extrude(amount=F2_DEPTH)


solid = f1.part
